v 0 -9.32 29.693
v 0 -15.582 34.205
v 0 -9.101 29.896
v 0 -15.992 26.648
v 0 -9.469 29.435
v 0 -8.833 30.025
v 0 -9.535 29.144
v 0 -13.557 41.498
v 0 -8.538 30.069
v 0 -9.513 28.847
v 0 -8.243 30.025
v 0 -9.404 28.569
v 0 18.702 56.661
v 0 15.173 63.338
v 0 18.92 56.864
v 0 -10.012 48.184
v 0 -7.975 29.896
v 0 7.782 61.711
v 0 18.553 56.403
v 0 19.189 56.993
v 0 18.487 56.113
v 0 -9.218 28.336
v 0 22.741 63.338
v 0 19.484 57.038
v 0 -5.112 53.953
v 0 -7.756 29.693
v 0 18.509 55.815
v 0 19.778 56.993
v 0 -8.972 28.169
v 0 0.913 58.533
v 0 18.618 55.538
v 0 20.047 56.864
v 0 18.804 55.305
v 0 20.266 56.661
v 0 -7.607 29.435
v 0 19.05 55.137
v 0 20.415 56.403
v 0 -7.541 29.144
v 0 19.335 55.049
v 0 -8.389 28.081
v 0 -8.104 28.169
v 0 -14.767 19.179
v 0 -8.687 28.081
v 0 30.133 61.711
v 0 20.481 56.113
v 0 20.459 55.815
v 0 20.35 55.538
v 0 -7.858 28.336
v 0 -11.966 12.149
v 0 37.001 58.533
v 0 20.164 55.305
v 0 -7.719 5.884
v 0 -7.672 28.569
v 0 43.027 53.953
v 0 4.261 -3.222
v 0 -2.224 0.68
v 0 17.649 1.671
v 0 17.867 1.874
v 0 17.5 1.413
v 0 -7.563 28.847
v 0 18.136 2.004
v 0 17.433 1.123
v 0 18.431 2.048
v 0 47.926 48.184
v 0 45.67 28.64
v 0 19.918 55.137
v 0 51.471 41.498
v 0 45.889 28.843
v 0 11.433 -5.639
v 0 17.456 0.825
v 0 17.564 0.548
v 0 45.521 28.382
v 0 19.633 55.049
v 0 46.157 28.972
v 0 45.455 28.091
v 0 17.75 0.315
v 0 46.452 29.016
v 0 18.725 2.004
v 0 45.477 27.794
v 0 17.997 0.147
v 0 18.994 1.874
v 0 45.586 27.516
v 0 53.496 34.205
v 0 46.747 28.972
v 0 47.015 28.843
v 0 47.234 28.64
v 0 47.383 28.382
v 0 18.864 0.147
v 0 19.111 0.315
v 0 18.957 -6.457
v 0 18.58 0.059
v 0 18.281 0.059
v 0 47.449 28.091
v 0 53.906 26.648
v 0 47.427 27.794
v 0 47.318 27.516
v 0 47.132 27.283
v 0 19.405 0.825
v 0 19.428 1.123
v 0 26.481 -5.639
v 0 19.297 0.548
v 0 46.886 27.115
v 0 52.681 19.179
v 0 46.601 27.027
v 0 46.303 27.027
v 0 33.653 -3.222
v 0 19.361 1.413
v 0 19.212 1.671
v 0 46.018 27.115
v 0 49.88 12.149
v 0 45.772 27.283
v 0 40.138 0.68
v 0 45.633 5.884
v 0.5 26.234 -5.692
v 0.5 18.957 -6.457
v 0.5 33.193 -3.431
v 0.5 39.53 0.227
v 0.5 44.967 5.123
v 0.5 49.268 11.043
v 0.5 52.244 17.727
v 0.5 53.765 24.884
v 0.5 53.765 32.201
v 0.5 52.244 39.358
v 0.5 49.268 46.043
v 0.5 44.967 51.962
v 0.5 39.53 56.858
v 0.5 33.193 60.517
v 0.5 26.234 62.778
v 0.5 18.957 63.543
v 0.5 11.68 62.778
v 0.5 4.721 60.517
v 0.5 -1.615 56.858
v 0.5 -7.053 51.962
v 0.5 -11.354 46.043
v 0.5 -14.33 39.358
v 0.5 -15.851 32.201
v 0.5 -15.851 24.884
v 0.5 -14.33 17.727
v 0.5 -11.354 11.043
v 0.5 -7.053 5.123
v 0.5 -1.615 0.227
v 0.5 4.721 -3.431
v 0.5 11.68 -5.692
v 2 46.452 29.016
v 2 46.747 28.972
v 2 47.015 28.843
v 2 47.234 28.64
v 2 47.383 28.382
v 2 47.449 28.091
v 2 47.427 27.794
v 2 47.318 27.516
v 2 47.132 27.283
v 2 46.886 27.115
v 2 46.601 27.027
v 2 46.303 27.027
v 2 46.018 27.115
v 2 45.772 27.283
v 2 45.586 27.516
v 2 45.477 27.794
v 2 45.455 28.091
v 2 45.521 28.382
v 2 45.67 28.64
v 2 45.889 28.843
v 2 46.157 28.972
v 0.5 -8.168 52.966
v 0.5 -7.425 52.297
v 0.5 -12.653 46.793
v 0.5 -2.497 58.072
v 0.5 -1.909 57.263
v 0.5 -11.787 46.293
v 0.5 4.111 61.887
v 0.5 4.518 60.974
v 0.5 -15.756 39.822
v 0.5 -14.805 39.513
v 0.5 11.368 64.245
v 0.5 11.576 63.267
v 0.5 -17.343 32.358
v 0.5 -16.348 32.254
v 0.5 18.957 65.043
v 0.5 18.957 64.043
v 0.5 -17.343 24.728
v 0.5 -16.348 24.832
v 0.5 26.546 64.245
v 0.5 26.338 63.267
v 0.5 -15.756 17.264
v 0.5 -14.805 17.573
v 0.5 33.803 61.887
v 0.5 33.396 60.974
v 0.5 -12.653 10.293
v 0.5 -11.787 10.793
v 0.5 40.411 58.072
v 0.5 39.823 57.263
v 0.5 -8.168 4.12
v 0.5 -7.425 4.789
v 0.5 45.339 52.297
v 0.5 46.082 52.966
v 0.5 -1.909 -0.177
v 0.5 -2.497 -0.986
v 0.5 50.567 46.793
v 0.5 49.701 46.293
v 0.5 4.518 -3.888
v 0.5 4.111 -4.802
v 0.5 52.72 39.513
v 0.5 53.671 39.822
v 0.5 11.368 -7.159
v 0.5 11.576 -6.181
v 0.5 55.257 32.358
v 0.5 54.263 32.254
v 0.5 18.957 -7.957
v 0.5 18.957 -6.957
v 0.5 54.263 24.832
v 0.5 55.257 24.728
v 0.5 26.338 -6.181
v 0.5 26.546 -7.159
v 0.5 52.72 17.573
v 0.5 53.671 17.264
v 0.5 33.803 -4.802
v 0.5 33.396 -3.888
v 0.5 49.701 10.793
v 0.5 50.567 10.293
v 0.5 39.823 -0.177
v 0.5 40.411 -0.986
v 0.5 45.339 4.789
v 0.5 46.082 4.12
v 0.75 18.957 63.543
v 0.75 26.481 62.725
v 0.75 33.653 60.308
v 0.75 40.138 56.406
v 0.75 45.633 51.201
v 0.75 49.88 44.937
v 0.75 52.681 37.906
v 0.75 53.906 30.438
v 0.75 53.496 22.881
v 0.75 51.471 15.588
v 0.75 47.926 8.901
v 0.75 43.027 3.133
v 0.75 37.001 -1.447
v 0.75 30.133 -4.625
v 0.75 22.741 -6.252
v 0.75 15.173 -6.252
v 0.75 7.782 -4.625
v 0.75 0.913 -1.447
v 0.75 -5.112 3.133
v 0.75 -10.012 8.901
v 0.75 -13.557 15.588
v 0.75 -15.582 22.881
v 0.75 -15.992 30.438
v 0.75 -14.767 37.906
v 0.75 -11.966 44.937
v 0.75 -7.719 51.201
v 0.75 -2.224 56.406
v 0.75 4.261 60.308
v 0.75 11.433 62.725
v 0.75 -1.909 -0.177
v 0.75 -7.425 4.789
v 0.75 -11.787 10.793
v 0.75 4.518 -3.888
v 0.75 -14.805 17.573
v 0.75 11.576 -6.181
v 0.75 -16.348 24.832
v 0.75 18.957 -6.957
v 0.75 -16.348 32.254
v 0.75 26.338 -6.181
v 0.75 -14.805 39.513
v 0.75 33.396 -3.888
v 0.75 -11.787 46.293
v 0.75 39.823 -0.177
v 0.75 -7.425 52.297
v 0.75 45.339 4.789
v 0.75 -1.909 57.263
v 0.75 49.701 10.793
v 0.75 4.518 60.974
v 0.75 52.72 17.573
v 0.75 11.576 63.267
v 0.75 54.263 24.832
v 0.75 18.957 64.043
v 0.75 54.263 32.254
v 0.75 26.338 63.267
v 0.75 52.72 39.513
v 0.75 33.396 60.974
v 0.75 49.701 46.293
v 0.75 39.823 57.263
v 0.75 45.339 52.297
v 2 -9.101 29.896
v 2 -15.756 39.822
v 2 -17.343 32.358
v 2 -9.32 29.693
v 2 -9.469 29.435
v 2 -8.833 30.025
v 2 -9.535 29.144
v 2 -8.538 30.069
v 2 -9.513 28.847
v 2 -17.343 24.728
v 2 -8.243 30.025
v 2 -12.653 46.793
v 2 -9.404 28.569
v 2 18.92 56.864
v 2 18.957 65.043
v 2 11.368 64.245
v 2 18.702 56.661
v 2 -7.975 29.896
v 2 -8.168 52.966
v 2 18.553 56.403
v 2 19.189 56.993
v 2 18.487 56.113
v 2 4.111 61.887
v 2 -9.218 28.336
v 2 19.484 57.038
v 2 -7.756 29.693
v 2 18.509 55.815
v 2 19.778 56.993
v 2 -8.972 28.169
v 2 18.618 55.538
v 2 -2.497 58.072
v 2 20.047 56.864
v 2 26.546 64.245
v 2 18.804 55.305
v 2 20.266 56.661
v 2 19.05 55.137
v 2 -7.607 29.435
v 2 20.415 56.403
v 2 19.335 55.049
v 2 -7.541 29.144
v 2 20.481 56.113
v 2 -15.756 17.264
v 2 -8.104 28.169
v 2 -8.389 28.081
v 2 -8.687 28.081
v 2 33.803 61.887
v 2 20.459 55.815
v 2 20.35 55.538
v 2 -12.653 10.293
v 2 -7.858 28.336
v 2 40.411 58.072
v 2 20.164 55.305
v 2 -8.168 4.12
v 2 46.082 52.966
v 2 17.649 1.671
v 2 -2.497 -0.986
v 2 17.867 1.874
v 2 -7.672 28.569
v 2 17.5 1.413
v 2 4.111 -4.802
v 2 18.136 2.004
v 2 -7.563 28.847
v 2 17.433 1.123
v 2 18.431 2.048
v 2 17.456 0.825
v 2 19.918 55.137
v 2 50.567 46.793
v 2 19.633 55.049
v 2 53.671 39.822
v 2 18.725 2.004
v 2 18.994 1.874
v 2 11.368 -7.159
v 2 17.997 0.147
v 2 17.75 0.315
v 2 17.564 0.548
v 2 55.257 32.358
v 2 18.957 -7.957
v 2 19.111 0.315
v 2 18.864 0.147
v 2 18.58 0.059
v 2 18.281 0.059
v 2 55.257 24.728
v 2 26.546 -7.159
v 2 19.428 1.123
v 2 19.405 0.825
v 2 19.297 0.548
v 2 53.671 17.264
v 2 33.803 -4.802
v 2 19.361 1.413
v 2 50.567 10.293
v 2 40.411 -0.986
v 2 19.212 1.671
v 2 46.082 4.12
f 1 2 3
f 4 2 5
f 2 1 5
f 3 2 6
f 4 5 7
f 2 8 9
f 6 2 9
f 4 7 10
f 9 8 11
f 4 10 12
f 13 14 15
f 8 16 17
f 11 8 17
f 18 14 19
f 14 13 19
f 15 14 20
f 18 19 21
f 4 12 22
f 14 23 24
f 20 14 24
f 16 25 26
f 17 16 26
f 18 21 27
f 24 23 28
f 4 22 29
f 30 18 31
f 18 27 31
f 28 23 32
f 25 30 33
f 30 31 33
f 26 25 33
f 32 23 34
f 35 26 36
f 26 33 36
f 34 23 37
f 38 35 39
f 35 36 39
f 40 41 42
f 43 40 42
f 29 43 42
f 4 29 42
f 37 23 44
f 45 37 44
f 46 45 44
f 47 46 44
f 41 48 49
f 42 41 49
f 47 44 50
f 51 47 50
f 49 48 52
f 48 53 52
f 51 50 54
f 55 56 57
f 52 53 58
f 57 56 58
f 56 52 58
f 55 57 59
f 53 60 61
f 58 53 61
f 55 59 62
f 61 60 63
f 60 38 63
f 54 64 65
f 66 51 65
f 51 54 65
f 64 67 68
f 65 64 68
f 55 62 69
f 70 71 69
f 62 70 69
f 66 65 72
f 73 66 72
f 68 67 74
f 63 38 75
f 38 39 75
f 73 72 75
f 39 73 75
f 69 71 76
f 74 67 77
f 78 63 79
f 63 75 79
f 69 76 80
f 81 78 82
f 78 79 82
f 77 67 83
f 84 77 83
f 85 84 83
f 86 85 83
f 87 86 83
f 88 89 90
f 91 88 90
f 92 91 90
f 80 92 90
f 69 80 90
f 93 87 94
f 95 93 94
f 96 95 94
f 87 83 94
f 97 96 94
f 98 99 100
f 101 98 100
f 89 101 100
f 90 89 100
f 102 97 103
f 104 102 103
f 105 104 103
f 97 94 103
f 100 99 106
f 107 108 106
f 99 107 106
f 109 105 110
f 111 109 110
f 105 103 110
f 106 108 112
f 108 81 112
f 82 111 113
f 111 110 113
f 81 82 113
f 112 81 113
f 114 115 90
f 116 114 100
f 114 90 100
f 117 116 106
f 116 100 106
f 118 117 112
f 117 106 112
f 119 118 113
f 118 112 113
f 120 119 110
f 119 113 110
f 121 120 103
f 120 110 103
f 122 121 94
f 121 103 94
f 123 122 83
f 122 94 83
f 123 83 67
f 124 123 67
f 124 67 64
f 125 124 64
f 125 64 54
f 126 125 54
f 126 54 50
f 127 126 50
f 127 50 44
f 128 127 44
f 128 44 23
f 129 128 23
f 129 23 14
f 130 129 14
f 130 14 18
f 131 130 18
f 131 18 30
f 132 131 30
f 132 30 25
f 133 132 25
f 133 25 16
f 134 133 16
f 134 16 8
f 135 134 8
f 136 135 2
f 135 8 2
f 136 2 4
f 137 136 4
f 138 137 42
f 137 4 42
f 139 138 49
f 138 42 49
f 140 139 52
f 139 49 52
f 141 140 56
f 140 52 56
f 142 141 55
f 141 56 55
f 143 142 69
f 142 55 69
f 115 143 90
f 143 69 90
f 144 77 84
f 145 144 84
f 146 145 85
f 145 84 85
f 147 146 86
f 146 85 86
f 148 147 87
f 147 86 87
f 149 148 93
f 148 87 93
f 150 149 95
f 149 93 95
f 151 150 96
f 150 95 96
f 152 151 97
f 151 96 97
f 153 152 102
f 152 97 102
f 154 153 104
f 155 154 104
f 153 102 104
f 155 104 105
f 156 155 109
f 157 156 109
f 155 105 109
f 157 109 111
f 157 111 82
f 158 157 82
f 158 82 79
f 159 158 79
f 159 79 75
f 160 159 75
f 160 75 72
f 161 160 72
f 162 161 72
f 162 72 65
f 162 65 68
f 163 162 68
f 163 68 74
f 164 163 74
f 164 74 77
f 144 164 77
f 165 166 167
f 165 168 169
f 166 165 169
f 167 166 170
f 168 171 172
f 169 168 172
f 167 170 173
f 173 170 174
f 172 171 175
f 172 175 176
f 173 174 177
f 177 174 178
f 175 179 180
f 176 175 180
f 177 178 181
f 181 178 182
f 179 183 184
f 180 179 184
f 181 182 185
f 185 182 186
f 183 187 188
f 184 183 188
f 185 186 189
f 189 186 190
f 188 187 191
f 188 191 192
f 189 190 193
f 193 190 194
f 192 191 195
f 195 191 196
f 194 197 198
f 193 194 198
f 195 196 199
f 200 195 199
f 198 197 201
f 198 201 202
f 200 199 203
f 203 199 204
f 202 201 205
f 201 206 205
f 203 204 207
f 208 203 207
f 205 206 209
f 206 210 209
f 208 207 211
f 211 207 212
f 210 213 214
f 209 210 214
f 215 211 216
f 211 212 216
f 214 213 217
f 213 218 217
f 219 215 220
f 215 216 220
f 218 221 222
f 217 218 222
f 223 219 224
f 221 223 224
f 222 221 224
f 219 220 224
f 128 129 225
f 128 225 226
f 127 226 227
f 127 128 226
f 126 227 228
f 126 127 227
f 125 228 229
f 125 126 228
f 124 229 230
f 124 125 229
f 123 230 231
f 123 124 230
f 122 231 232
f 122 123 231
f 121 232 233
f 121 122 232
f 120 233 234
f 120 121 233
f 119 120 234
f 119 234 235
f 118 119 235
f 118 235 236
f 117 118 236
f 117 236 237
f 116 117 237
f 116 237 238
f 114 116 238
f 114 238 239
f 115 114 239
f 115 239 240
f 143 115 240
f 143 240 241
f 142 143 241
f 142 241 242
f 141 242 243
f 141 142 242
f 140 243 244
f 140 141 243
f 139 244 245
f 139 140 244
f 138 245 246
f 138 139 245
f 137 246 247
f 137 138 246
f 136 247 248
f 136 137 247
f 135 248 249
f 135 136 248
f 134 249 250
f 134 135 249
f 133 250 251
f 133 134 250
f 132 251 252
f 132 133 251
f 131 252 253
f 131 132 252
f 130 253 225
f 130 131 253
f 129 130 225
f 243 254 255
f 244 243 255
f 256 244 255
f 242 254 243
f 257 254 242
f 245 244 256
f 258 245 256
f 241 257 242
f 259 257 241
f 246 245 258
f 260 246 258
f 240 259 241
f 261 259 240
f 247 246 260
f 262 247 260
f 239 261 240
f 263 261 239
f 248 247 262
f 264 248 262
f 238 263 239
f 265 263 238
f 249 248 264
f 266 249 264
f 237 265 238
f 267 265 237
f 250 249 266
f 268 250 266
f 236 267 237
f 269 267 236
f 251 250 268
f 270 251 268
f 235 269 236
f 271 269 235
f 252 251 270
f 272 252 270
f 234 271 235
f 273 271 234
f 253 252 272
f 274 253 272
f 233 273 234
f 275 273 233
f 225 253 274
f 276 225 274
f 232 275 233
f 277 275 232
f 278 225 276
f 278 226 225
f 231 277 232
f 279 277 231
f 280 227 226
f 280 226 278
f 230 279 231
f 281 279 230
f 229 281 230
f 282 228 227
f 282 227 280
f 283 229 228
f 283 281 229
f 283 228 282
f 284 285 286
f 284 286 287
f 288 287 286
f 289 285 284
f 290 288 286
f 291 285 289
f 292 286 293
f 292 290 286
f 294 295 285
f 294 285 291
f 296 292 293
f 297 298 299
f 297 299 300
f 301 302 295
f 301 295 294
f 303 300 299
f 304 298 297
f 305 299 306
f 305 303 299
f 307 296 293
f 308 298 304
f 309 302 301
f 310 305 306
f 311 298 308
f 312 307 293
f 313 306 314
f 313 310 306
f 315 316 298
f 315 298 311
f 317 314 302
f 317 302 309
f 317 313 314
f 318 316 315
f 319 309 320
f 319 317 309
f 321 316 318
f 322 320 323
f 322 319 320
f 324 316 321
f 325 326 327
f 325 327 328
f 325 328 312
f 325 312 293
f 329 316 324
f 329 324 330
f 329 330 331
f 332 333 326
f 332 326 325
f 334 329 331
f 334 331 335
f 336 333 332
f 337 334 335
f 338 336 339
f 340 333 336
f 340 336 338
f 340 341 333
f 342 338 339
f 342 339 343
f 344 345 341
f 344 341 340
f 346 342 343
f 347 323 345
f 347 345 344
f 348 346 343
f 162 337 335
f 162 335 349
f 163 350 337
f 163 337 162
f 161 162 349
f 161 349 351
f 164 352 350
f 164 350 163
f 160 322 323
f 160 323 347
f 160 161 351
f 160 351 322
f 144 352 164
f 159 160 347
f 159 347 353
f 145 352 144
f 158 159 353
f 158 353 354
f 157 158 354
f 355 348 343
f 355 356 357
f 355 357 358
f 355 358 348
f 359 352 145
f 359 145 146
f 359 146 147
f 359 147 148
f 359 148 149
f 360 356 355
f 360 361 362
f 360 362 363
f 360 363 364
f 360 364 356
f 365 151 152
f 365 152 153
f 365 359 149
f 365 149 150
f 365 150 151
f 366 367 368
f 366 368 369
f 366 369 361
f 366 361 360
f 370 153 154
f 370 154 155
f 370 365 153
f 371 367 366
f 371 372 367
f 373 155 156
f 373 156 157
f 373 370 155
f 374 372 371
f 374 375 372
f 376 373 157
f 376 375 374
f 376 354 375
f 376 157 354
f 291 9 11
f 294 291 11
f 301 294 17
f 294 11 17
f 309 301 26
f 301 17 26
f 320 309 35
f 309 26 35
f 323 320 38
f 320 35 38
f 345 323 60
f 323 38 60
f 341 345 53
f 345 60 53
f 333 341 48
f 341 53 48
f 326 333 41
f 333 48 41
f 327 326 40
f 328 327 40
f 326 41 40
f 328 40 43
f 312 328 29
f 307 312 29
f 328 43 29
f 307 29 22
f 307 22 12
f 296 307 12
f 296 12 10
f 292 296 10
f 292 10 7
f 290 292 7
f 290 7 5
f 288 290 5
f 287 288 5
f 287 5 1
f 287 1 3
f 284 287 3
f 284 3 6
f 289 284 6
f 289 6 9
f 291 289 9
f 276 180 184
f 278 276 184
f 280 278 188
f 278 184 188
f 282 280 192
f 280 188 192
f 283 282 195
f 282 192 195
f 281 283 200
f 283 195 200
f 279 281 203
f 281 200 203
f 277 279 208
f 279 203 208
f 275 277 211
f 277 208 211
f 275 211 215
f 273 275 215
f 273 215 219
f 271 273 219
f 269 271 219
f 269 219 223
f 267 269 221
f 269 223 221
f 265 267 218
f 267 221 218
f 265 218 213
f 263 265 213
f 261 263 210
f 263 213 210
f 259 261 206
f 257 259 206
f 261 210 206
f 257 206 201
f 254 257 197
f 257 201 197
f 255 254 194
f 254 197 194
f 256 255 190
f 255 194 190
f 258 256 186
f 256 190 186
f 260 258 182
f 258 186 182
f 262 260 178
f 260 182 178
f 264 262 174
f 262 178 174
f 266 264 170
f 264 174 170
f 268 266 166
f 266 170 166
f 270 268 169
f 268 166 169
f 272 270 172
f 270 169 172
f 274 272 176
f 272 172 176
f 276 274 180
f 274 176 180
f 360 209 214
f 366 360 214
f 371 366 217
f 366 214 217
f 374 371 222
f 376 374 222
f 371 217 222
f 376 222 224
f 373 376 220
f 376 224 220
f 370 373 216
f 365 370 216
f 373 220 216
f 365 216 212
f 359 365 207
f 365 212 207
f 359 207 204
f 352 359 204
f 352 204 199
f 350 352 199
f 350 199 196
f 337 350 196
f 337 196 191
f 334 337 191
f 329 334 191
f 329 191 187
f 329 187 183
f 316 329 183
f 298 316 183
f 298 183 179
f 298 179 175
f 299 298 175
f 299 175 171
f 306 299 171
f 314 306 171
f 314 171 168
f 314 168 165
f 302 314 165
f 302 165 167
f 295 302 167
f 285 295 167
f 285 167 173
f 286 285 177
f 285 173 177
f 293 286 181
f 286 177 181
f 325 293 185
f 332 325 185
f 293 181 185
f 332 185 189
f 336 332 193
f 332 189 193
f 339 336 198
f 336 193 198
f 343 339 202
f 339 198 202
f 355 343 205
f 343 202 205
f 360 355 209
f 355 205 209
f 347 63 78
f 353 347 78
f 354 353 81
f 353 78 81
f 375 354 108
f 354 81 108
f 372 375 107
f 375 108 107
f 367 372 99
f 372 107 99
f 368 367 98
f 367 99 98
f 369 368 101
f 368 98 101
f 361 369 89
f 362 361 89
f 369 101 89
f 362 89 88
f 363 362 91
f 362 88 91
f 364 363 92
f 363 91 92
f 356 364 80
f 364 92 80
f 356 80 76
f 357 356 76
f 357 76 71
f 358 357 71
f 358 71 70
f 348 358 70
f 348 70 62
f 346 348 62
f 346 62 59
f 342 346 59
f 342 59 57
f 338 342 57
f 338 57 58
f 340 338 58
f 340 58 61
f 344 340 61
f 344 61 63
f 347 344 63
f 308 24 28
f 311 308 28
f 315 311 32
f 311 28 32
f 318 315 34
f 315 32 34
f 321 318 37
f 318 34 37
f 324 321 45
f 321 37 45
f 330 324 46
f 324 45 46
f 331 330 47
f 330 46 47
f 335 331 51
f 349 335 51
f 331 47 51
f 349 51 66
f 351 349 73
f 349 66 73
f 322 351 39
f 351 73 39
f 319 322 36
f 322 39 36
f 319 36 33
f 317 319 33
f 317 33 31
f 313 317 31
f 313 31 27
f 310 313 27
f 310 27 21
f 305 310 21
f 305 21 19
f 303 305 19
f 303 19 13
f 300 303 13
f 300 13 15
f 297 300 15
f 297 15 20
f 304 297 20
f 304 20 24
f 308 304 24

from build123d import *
from build123d.topology import SkipClean

# Parameters (mm, degrees)
SKETCH1_R           = 36.5
BOSS_EXTRUDE1_DEPTH = 2
SKETCH2_R           = 1
CUT_EXTRUDE1_DEPTH  = 82.563170228
SKETCH3_R           = 36.5
SKETCH3_R_2         = 35
CUT_EXTRUDE2_DEPTH  = 0.5
SKETCH4_R           = 35.5
SKETCH4_R_2         = 35
CUT_EXTRUDE3_DEPTH  = 0.25


with BuildPart() as part:
    # Sketch1 → Boss-Extrude1 (new body)
    with BuildSketch(Plane(origin=(0, 0, 0), x_dir=(0, 0, -1), z_dir=(1, 0, 0))):
        with Locations((-28.542888787, 18.957113921)):
            Circle(SKETCH1_R)
    extrude(amount=BOSS_EXTRUDE1_DEPTH)

    # Sketch2 → Cut-Extrude1 (cut, through all)
    with BuildSketch(Plane(origin=(-11.5, 40.326440474, 9.173024085), x_dir=(0, -0.9998166429303736, 0.019148903870400247), z_dir=(-1, 0, 0))):
        with Locations(Location((21.736320014, 46.457113921, 0), (0, 0, 88.902781564))):
            Circle(SKETCH2_R)
        with Locations(Location((21.736320014, -8.542886079, 0), (0, 0, 88.902781564))):
            Circle(SKETCH2_R)
        with Locations(Location((49.236320014, 18.957113921, 0), (0, 0, 88.902781564))):
            Circle(SKETCH2_R)
        with Locations(Location((-5.763679986, 18.957113921, 0), (0, 0, 88.902781564))):
            Circle(SKETCH2_R)
    extrude(amount=-CUT_EXTRUDE1_DEPTH, mode=Mode.SUBTRACT)

    # Sketch3 → Cut-Extrude2 (cut)
    with BuildSketch(Plane(origin=(0, 0, 0), x_dir=(0, 0, -1), z_dir=(1, 0, 0))):
        with Locations((-28.542888787, 18.957113921)):
            Circle(SKETCH3_R)
        with Locations((-28.542888787, 18.957113921)):
            Circle(SKETCH3_R_2, mode=Mode.SUBTRACT)
    extrude(amount=CUT_EXTRUDE2_DEPTH, mode=Mode.SUBTRACT)

    # Sketch4 → Cut-Extrude3 (cut)
    with SkipClean():  # the faces are left unmerged after this step: merging them gives an invalid solid
        with BuildSketch(Plane.ZY.offset(-0.5)):
            with Locations((28.542888787, 18.957113921)):
                Circle(SKETCH4_R)
            with Locations((28.542888787, 18.957113921)):
                Circle(SKETCH4_R_2, mode=Mode.SUBTRACT)
        extrude(amount=-CUT_EXTRUDE3_DEPTH, mode=Mode.SUBTRACT)


solid = part.part
